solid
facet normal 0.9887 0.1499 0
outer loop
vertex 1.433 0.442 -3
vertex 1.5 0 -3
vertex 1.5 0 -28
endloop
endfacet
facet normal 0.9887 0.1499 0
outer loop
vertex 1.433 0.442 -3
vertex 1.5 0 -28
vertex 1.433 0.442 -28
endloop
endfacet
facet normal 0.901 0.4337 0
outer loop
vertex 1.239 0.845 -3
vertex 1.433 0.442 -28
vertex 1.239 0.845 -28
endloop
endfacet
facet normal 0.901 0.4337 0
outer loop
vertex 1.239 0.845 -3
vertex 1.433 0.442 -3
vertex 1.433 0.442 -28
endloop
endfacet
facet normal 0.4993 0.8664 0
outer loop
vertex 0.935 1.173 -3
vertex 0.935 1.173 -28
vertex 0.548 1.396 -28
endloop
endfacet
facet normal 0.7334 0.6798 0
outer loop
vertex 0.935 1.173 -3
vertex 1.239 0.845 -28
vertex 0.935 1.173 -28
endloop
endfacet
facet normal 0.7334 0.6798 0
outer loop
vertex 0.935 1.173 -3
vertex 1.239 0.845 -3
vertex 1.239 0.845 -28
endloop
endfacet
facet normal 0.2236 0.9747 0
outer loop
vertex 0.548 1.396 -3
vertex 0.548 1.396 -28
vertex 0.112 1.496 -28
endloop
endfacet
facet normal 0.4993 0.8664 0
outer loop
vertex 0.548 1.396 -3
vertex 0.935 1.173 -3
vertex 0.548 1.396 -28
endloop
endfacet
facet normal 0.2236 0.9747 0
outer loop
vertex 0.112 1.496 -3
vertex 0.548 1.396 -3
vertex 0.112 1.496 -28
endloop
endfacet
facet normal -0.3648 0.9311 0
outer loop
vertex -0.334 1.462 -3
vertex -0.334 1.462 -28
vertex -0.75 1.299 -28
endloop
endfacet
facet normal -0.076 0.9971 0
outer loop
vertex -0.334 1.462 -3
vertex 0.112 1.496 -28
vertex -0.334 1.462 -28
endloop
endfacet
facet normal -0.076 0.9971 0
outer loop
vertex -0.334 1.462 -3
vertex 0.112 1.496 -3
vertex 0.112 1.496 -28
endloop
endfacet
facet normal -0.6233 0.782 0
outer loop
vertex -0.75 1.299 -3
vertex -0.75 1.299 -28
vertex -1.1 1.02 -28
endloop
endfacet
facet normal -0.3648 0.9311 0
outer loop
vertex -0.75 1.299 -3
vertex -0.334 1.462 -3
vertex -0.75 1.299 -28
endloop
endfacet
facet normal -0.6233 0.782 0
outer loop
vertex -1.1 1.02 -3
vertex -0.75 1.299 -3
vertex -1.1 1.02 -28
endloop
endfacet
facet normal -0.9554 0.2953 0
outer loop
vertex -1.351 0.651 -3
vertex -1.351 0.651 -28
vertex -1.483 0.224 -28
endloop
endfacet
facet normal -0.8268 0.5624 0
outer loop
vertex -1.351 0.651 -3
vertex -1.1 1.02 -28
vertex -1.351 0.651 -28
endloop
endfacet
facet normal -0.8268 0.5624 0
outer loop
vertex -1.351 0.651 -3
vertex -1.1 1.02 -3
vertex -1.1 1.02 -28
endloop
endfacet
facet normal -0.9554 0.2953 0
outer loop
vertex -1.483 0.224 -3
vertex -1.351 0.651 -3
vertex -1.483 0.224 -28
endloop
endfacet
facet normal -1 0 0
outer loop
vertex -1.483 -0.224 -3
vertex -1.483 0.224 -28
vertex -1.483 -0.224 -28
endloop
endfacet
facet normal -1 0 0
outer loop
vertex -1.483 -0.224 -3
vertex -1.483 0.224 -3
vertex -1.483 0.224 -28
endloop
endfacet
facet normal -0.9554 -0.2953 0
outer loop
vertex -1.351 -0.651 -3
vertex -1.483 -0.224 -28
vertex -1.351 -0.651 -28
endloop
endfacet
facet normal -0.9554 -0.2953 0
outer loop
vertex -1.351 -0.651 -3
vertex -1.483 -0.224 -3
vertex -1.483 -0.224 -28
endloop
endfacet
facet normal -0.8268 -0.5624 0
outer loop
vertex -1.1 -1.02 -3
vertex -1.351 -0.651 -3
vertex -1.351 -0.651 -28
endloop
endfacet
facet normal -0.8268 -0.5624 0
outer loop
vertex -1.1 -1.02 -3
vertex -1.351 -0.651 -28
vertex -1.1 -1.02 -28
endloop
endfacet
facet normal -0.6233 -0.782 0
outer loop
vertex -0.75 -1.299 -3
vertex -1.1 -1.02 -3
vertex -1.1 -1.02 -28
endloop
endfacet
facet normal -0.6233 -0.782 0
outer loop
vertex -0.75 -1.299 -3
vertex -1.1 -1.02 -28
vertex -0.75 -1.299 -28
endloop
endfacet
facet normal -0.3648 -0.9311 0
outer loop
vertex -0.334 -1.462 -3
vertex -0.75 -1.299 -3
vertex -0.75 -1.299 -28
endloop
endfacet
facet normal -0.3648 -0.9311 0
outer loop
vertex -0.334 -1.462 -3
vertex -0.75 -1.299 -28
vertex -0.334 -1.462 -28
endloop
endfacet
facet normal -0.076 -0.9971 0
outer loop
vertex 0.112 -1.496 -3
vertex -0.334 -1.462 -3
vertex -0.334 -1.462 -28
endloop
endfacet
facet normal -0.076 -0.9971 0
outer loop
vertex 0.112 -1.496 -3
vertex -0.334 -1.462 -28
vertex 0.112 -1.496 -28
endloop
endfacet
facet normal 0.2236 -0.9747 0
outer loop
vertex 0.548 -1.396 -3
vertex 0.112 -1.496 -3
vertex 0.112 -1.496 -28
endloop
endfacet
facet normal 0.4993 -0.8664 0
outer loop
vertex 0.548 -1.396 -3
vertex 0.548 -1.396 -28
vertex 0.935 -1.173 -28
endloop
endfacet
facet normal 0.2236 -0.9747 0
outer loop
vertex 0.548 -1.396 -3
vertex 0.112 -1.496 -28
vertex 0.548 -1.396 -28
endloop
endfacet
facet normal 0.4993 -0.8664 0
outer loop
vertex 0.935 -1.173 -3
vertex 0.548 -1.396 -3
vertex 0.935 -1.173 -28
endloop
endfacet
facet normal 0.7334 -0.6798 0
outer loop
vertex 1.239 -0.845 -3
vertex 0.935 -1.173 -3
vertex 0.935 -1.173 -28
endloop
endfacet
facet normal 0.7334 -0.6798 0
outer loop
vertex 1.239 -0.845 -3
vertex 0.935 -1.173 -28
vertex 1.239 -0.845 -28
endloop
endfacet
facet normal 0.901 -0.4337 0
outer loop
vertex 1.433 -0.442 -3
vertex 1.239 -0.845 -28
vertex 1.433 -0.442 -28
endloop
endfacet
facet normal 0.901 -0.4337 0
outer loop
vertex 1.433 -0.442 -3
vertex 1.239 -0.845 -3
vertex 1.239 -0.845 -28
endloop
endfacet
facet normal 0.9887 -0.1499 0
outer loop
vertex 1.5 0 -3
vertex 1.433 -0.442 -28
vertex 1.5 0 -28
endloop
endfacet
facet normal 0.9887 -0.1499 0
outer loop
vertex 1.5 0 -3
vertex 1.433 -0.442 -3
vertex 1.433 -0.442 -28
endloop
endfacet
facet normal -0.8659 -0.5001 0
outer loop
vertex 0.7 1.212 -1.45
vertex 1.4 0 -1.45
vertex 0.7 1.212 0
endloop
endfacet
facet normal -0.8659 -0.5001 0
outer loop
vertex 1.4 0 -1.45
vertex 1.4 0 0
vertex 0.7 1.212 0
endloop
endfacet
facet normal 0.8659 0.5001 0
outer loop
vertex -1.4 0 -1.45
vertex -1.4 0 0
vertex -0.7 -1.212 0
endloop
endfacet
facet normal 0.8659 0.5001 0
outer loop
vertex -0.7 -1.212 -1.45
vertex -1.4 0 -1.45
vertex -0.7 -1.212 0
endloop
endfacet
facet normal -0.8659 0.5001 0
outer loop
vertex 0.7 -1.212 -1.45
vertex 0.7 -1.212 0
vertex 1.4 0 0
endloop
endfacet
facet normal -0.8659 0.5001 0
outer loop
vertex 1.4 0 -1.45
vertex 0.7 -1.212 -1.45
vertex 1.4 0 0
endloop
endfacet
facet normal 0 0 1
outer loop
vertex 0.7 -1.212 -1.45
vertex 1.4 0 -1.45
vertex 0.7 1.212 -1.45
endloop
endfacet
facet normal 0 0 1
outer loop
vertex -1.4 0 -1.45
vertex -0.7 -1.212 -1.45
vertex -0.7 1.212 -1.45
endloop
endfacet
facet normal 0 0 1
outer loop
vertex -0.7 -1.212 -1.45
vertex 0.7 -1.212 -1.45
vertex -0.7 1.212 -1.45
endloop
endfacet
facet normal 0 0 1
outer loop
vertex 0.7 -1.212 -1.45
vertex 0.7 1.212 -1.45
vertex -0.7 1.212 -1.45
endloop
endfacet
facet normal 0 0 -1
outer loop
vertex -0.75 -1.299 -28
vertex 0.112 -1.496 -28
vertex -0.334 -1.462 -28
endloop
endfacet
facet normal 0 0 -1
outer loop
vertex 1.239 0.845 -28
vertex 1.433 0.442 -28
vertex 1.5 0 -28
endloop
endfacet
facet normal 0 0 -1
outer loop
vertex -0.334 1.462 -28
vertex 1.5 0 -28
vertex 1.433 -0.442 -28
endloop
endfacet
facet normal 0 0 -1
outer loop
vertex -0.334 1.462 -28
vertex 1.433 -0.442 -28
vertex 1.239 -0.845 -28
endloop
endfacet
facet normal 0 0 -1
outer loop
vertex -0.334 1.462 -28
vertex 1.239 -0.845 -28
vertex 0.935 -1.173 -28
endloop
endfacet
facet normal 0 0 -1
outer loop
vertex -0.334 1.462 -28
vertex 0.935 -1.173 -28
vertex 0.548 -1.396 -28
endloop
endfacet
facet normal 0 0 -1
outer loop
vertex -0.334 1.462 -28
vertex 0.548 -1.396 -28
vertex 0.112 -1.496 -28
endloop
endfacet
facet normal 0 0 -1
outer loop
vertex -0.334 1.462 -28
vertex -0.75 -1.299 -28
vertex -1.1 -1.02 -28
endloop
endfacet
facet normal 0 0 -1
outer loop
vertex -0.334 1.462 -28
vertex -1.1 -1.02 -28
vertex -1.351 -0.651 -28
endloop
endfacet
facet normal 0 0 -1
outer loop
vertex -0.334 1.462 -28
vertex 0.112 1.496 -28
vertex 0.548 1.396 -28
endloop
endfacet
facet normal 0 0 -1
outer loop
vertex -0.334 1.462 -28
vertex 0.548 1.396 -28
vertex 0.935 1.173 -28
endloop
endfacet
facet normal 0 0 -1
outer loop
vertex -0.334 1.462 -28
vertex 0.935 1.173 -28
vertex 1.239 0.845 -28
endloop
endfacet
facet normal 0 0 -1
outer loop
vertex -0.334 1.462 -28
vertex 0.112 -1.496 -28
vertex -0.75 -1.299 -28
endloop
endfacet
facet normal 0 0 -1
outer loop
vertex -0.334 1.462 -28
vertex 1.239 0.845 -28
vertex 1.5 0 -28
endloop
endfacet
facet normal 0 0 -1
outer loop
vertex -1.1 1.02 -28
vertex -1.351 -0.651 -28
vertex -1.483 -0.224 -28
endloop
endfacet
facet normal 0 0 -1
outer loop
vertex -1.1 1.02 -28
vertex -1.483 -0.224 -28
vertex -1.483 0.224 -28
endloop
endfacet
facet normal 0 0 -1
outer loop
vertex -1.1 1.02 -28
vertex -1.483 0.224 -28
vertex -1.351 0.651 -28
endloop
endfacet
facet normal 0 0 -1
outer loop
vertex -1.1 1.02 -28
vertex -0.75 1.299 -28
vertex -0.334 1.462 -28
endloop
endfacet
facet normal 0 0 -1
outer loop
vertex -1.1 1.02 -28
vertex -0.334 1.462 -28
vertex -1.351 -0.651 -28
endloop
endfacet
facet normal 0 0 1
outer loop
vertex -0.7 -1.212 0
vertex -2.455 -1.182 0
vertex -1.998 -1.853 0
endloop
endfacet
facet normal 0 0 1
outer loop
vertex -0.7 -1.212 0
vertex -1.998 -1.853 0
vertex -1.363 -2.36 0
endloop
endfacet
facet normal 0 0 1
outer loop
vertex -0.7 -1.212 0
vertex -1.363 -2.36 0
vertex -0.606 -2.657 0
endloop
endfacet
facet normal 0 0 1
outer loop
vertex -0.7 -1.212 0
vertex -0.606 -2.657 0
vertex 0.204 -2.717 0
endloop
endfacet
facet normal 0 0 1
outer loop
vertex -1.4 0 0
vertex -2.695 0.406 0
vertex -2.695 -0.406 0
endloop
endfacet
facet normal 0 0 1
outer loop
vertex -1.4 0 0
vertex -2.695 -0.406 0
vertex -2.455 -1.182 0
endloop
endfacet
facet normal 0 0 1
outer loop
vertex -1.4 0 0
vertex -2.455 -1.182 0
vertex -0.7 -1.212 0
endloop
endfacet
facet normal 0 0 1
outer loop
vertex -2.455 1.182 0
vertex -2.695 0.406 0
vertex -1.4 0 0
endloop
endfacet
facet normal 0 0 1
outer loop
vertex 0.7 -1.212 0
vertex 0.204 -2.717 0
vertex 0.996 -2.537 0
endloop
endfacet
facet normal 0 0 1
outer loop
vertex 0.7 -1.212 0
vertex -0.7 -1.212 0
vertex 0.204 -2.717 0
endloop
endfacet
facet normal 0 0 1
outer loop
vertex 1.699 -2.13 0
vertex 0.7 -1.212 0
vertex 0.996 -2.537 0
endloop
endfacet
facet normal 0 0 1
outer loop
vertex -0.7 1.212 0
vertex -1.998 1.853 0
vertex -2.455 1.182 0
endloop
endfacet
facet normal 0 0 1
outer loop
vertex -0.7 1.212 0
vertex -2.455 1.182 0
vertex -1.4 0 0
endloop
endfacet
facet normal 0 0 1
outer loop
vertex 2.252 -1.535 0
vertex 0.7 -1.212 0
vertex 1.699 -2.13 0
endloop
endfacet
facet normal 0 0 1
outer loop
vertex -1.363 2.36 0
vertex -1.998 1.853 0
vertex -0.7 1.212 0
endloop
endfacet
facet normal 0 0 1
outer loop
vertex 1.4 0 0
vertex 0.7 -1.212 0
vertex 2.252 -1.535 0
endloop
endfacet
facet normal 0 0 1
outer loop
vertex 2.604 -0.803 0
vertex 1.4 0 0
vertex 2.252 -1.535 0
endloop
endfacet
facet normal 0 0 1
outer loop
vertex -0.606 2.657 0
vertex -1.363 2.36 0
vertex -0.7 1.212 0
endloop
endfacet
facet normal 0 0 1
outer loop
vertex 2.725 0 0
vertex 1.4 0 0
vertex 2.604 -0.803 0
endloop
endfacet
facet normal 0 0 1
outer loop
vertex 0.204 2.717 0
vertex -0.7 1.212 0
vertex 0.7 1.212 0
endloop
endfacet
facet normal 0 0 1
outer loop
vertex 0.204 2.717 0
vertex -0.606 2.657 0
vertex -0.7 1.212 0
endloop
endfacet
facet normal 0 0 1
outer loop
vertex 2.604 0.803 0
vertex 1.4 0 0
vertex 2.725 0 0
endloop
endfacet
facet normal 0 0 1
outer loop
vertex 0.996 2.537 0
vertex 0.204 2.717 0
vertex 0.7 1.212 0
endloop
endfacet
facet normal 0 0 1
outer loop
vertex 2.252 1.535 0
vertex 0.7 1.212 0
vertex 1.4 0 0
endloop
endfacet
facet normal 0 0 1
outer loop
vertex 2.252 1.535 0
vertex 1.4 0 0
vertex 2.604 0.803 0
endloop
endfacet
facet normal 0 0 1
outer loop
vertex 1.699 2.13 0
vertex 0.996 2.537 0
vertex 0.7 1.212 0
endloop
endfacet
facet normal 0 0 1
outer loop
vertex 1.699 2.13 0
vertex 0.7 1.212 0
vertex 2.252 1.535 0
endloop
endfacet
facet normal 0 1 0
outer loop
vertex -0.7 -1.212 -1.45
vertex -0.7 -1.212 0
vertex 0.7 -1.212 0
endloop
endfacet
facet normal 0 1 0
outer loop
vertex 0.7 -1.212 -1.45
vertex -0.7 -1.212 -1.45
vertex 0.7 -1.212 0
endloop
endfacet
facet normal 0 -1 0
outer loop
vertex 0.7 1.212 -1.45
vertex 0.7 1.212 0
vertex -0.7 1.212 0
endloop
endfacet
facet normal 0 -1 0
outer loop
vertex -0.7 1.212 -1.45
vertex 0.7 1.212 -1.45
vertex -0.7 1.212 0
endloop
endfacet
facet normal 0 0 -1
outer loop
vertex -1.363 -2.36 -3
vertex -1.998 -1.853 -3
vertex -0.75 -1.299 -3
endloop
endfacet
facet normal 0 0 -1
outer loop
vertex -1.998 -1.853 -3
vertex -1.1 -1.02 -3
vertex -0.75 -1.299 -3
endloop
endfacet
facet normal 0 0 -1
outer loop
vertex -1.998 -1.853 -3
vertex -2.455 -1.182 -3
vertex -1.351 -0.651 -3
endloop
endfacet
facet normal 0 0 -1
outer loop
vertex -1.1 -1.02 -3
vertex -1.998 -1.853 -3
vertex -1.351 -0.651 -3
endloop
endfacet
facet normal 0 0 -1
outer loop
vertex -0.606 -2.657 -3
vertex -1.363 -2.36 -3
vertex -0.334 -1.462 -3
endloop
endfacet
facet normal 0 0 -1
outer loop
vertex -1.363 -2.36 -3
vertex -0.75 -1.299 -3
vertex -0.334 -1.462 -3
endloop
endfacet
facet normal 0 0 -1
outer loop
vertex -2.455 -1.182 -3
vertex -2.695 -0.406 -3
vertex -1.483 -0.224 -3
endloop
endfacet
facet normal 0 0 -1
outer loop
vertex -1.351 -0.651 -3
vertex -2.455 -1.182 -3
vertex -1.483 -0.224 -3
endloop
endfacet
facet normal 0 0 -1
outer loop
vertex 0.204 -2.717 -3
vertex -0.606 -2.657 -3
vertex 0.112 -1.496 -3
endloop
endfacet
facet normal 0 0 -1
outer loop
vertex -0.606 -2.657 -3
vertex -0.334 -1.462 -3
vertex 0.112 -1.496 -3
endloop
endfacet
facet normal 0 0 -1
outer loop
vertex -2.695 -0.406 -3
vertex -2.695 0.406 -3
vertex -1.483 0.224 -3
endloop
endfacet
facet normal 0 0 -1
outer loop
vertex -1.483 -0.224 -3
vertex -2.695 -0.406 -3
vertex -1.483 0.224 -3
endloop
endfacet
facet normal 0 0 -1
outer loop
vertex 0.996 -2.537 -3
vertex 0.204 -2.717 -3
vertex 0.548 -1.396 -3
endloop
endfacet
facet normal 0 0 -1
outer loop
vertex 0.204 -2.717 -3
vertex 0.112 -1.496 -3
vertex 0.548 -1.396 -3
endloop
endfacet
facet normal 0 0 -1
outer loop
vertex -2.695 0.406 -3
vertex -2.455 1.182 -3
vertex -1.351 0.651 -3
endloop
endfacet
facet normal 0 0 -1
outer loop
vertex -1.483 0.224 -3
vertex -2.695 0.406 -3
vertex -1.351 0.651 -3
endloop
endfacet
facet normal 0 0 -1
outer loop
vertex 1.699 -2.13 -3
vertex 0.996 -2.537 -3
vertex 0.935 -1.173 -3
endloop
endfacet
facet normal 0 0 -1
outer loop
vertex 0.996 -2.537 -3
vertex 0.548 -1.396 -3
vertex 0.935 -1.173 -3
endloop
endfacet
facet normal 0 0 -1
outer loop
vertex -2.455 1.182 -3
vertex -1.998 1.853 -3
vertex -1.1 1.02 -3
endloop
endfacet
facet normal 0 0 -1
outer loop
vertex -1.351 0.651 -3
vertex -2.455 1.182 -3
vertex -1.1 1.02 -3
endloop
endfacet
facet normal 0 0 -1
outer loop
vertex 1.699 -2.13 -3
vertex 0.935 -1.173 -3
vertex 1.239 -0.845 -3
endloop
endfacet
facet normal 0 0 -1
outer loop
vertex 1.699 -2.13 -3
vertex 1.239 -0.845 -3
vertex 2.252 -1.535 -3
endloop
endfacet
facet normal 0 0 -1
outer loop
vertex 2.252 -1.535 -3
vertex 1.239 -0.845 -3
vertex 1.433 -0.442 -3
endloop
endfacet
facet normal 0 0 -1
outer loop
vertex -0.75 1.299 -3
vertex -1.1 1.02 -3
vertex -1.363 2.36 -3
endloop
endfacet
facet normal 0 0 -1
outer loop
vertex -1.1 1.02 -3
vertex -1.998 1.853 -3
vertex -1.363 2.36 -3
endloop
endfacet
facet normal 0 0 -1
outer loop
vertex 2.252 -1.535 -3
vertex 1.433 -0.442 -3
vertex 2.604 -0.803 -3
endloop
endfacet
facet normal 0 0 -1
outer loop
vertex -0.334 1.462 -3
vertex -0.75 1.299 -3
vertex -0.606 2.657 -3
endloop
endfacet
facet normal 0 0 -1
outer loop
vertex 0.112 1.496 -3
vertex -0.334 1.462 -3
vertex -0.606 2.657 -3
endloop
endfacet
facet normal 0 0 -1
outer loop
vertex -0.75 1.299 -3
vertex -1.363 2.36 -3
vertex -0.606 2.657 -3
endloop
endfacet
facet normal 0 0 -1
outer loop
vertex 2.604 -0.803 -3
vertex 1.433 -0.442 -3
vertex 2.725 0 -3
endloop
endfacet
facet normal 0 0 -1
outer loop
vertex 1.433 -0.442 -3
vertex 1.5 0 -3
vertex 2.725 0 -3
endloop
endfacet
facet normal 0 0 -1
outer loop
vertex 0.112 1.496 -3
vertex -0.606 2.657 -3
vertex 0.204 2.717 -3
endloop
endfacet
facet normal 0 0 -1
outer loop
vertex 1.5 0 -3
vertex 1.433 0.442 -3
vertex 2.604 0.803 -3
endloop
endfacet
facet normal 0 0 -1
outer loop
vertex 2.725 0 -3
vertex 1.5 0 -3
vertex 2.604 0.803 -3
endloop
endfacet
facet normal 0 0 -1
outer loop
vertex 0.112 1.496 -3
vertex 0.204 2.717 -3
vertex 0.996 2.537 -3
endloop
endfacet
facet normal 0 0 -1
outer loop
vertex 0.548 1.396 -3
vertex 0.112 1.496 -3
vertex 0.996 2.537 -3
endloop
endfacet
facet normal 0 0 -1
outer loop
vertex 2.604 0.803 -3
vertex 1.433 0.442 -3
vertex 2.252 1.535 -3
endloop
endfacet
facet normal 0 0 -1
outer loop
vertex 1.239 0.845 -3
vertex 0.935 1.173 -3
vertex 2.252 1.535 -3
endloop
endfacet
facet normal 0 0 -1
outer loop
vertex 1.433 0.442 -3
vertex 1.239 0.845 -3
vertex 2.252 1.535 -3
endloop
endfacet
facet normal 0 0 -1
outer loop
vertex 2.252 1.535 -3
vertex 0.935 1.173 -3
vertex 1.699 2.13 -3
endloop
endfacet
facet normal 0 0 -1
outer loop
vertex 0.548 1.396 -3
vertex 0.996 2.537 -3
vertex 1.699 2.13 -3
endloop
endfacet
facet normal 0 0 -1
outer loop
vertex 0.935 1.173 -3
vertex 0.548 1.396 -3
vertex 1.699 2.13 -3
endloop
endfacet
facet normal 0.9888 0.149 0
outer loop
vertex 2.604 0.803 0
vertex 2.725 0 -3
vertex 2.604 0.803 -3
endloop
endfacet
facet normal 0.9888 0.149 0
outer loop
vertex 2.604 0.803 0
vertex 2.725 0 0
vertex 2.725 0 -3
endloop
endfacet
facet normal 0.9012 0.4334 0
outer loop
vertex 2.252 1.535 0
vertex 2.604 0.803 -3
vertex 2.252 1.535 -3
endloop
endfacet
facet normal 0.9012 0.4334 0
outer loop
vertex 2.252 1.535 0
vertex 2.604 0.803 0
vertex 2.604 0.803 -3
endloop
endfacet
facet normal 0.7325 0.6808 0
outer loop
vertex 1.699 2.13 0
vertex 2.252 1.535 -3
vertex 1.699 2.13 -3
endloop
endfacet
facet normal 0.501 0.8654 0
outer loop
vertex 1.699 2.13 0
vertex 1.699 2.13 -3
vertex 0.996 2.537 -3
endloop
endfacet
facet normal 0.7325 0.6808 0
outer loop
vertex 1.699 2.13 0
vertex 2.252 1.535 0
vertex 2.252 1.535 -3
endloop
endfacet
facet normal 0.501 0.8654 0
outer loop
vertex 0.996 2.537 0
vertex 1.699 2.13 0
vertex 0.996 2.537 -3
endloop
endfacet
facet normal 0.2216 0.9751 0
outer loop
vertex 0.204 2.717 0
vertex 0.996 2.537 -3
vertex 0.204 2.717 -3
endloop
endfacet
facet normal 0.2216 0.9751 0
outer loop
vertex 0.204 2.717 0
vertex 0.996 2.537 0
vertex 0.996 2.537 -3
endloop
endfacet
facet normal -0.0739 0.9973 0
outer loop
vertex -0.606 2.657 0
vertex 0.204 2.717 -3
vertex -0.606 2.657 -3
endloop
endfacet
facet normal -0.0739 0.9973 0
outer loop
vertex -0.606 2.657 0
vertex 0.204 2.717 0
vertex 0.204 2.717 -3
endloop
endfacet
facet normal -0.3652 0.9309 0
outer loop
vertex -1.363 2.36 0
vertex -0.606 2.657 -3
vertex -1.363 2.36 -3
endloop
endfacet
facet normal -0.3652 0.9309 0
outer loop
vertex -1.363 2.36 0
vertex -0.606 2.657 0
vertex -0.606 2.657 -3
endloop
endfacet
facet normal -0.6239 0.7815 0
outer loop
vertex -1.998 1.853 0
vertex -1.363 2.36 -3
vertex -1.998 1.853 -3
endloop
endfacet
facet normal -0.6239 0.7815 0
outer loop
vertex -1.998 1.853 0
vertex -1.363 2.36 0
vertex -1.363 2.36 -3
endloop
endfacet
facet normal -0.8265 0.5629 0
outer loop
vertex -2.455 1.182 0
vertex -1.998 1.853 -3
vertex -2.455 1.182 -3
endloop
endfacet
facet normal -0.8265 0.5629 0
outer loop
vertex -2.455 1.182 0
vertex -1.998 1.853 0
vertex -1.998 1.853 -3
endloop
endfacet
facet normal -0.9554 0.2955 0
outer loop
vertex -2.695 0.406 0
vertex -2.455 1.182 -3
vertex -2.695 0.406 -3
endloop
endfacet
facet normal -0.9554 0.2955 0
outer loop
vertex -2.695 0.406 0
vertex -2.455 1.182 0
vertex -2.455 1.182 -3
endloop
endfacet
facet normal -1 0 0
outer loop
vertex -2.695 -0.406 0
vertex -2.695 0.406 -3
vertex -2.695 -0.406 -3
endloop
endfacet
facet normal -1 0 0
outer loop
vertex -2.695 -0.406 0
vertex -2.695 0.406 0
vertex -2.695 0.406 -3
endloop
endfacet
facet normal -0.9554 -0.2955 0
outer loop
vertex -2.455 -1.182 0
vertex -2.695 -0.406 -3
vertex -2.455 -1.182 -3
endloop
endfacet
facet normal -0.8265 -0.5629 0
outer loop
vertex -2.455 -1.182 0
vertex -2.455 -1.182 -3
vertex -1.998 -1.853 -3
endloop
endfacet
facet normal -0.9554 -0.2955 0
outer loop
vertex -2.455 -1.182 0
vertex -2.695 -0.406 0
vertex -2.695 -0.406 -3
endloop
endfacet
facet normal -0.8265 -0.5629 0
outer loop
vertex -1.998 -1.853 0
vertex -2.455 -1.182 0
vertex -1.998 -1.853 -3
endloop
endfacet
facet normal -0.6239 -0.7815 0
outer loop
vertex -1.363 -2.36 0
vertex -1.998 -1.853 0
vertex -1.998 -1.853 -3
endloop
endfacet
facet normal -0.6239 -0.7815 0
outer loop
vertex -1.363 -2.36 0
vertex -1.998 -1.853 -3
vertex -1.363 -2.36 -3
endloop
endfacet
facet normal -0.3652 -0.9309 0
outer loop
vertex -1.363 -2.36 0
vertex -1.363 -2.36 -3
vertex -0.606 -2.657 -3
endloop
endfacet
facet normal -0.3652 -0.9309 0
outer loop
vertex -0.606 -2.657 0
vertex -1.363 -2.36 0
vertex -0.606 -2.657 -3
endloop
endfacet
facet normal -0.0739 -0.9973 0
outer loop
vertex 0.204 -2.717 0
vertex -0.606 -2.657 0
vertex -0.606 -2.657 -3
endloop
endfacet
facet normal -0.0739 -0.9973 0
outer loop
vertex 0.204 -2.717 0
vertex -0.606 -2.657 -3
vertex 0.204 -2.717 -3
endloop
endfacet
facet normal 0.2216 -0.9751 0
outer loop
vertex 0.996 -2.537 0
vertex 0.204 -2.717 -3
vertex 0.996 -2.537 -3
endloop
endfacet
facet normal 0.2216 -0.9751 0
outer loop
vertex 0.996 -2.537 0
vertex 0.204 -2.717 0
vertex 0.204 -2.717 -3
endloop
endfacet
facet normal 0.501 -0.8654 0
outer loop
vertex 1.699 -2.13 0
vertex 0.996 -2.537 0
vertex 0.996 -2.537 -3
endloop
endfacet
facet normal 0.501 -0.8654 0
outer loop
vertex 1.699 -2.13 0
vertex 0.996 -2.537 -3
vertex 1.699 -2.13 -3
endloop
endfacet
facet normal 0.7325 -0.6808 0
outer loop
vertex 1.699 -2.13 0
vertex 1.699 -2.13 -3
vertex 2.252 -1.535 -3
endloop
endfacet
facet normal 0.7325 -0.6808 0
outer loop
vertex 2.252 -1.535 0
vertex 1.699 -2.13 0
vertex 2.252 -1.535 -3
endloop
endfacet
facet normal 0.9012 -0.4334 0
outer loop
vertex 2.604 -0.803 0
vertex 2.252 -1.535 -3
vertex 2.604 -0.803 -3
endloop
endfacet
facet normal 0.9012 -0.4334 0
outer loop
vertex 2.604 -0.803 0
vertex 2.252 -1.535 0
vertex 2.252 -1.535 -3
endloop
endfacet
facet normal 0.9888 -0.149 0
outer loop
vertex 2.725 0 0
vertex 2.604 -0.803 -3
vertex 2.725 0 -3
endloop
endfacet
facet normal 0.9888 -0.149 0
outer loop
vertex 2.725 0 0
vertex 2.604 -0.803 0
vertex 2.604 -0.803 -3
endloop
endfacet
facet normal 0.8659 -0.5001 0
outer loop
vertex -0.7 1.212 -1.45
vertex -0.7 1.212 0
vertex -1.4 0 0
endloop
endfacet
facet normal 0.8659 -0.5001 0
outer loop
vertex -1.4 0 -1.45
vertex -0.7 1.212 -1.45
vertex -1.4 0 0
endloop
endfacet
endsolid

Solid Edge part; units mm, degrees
sketch "Sketch1" plane through (0, 0, 0) normal (0, 0, 1) x (1, 0, 0)
  circle A0 centre (0, 0) radius 2.725
extrude "Protrusion1" add sketch "Sketch1" against normal blind 3
sketch "Sketch2" plane through (0, 0, 0) normal (0, 0, 1) x (1, 0, 0)
  line L0 (-0.7, -1.2124) -> (-1.05, -0.6062)
  line L1 (-1.4, 0) -> (-1.05, -0.6062)
  line L2 (-1.4, 0) -> (-1.05, 0.6062)
  line L3 (-0.7, 1.2124) -> (-1.05, 0.6062)
  line L4 (-0.7, 1.2124) -> (0, 1.2124)
  line L5 (0.7, 1.2124) -> (0, 1.2124)
  line L6 (0.7, 1.2124) -> (1.05, 0.6062)
  line L7 (1.4, 0) -> (1.05, 0.6062)
  line L8 (1.4, 0) -> (1.05, -0.6062)
  line L9 (0.7, -1.2124) -> (1.05, -0.6062)
  line L10 (0.7, -1.2124) -> (0, -1.2124)
  line L11 (-0.7, -1.2124) -> (0, -1.2124)
extrude "ExtrudedCutout_1" cut sketch "Sketch2" against normal blind 1.45
sketch "Sketch3" plane through (0, 0, -3) normal (0, 0, -1) x (1, 0, 0)
  circle A0 centre (0, 0) radius 1.5
extrude "ExtrudedProtrusion_2" add sketch "Sketch3" along normal blind 25
cosmetic_thread "Thread_2" size "M3" thread depth 17
